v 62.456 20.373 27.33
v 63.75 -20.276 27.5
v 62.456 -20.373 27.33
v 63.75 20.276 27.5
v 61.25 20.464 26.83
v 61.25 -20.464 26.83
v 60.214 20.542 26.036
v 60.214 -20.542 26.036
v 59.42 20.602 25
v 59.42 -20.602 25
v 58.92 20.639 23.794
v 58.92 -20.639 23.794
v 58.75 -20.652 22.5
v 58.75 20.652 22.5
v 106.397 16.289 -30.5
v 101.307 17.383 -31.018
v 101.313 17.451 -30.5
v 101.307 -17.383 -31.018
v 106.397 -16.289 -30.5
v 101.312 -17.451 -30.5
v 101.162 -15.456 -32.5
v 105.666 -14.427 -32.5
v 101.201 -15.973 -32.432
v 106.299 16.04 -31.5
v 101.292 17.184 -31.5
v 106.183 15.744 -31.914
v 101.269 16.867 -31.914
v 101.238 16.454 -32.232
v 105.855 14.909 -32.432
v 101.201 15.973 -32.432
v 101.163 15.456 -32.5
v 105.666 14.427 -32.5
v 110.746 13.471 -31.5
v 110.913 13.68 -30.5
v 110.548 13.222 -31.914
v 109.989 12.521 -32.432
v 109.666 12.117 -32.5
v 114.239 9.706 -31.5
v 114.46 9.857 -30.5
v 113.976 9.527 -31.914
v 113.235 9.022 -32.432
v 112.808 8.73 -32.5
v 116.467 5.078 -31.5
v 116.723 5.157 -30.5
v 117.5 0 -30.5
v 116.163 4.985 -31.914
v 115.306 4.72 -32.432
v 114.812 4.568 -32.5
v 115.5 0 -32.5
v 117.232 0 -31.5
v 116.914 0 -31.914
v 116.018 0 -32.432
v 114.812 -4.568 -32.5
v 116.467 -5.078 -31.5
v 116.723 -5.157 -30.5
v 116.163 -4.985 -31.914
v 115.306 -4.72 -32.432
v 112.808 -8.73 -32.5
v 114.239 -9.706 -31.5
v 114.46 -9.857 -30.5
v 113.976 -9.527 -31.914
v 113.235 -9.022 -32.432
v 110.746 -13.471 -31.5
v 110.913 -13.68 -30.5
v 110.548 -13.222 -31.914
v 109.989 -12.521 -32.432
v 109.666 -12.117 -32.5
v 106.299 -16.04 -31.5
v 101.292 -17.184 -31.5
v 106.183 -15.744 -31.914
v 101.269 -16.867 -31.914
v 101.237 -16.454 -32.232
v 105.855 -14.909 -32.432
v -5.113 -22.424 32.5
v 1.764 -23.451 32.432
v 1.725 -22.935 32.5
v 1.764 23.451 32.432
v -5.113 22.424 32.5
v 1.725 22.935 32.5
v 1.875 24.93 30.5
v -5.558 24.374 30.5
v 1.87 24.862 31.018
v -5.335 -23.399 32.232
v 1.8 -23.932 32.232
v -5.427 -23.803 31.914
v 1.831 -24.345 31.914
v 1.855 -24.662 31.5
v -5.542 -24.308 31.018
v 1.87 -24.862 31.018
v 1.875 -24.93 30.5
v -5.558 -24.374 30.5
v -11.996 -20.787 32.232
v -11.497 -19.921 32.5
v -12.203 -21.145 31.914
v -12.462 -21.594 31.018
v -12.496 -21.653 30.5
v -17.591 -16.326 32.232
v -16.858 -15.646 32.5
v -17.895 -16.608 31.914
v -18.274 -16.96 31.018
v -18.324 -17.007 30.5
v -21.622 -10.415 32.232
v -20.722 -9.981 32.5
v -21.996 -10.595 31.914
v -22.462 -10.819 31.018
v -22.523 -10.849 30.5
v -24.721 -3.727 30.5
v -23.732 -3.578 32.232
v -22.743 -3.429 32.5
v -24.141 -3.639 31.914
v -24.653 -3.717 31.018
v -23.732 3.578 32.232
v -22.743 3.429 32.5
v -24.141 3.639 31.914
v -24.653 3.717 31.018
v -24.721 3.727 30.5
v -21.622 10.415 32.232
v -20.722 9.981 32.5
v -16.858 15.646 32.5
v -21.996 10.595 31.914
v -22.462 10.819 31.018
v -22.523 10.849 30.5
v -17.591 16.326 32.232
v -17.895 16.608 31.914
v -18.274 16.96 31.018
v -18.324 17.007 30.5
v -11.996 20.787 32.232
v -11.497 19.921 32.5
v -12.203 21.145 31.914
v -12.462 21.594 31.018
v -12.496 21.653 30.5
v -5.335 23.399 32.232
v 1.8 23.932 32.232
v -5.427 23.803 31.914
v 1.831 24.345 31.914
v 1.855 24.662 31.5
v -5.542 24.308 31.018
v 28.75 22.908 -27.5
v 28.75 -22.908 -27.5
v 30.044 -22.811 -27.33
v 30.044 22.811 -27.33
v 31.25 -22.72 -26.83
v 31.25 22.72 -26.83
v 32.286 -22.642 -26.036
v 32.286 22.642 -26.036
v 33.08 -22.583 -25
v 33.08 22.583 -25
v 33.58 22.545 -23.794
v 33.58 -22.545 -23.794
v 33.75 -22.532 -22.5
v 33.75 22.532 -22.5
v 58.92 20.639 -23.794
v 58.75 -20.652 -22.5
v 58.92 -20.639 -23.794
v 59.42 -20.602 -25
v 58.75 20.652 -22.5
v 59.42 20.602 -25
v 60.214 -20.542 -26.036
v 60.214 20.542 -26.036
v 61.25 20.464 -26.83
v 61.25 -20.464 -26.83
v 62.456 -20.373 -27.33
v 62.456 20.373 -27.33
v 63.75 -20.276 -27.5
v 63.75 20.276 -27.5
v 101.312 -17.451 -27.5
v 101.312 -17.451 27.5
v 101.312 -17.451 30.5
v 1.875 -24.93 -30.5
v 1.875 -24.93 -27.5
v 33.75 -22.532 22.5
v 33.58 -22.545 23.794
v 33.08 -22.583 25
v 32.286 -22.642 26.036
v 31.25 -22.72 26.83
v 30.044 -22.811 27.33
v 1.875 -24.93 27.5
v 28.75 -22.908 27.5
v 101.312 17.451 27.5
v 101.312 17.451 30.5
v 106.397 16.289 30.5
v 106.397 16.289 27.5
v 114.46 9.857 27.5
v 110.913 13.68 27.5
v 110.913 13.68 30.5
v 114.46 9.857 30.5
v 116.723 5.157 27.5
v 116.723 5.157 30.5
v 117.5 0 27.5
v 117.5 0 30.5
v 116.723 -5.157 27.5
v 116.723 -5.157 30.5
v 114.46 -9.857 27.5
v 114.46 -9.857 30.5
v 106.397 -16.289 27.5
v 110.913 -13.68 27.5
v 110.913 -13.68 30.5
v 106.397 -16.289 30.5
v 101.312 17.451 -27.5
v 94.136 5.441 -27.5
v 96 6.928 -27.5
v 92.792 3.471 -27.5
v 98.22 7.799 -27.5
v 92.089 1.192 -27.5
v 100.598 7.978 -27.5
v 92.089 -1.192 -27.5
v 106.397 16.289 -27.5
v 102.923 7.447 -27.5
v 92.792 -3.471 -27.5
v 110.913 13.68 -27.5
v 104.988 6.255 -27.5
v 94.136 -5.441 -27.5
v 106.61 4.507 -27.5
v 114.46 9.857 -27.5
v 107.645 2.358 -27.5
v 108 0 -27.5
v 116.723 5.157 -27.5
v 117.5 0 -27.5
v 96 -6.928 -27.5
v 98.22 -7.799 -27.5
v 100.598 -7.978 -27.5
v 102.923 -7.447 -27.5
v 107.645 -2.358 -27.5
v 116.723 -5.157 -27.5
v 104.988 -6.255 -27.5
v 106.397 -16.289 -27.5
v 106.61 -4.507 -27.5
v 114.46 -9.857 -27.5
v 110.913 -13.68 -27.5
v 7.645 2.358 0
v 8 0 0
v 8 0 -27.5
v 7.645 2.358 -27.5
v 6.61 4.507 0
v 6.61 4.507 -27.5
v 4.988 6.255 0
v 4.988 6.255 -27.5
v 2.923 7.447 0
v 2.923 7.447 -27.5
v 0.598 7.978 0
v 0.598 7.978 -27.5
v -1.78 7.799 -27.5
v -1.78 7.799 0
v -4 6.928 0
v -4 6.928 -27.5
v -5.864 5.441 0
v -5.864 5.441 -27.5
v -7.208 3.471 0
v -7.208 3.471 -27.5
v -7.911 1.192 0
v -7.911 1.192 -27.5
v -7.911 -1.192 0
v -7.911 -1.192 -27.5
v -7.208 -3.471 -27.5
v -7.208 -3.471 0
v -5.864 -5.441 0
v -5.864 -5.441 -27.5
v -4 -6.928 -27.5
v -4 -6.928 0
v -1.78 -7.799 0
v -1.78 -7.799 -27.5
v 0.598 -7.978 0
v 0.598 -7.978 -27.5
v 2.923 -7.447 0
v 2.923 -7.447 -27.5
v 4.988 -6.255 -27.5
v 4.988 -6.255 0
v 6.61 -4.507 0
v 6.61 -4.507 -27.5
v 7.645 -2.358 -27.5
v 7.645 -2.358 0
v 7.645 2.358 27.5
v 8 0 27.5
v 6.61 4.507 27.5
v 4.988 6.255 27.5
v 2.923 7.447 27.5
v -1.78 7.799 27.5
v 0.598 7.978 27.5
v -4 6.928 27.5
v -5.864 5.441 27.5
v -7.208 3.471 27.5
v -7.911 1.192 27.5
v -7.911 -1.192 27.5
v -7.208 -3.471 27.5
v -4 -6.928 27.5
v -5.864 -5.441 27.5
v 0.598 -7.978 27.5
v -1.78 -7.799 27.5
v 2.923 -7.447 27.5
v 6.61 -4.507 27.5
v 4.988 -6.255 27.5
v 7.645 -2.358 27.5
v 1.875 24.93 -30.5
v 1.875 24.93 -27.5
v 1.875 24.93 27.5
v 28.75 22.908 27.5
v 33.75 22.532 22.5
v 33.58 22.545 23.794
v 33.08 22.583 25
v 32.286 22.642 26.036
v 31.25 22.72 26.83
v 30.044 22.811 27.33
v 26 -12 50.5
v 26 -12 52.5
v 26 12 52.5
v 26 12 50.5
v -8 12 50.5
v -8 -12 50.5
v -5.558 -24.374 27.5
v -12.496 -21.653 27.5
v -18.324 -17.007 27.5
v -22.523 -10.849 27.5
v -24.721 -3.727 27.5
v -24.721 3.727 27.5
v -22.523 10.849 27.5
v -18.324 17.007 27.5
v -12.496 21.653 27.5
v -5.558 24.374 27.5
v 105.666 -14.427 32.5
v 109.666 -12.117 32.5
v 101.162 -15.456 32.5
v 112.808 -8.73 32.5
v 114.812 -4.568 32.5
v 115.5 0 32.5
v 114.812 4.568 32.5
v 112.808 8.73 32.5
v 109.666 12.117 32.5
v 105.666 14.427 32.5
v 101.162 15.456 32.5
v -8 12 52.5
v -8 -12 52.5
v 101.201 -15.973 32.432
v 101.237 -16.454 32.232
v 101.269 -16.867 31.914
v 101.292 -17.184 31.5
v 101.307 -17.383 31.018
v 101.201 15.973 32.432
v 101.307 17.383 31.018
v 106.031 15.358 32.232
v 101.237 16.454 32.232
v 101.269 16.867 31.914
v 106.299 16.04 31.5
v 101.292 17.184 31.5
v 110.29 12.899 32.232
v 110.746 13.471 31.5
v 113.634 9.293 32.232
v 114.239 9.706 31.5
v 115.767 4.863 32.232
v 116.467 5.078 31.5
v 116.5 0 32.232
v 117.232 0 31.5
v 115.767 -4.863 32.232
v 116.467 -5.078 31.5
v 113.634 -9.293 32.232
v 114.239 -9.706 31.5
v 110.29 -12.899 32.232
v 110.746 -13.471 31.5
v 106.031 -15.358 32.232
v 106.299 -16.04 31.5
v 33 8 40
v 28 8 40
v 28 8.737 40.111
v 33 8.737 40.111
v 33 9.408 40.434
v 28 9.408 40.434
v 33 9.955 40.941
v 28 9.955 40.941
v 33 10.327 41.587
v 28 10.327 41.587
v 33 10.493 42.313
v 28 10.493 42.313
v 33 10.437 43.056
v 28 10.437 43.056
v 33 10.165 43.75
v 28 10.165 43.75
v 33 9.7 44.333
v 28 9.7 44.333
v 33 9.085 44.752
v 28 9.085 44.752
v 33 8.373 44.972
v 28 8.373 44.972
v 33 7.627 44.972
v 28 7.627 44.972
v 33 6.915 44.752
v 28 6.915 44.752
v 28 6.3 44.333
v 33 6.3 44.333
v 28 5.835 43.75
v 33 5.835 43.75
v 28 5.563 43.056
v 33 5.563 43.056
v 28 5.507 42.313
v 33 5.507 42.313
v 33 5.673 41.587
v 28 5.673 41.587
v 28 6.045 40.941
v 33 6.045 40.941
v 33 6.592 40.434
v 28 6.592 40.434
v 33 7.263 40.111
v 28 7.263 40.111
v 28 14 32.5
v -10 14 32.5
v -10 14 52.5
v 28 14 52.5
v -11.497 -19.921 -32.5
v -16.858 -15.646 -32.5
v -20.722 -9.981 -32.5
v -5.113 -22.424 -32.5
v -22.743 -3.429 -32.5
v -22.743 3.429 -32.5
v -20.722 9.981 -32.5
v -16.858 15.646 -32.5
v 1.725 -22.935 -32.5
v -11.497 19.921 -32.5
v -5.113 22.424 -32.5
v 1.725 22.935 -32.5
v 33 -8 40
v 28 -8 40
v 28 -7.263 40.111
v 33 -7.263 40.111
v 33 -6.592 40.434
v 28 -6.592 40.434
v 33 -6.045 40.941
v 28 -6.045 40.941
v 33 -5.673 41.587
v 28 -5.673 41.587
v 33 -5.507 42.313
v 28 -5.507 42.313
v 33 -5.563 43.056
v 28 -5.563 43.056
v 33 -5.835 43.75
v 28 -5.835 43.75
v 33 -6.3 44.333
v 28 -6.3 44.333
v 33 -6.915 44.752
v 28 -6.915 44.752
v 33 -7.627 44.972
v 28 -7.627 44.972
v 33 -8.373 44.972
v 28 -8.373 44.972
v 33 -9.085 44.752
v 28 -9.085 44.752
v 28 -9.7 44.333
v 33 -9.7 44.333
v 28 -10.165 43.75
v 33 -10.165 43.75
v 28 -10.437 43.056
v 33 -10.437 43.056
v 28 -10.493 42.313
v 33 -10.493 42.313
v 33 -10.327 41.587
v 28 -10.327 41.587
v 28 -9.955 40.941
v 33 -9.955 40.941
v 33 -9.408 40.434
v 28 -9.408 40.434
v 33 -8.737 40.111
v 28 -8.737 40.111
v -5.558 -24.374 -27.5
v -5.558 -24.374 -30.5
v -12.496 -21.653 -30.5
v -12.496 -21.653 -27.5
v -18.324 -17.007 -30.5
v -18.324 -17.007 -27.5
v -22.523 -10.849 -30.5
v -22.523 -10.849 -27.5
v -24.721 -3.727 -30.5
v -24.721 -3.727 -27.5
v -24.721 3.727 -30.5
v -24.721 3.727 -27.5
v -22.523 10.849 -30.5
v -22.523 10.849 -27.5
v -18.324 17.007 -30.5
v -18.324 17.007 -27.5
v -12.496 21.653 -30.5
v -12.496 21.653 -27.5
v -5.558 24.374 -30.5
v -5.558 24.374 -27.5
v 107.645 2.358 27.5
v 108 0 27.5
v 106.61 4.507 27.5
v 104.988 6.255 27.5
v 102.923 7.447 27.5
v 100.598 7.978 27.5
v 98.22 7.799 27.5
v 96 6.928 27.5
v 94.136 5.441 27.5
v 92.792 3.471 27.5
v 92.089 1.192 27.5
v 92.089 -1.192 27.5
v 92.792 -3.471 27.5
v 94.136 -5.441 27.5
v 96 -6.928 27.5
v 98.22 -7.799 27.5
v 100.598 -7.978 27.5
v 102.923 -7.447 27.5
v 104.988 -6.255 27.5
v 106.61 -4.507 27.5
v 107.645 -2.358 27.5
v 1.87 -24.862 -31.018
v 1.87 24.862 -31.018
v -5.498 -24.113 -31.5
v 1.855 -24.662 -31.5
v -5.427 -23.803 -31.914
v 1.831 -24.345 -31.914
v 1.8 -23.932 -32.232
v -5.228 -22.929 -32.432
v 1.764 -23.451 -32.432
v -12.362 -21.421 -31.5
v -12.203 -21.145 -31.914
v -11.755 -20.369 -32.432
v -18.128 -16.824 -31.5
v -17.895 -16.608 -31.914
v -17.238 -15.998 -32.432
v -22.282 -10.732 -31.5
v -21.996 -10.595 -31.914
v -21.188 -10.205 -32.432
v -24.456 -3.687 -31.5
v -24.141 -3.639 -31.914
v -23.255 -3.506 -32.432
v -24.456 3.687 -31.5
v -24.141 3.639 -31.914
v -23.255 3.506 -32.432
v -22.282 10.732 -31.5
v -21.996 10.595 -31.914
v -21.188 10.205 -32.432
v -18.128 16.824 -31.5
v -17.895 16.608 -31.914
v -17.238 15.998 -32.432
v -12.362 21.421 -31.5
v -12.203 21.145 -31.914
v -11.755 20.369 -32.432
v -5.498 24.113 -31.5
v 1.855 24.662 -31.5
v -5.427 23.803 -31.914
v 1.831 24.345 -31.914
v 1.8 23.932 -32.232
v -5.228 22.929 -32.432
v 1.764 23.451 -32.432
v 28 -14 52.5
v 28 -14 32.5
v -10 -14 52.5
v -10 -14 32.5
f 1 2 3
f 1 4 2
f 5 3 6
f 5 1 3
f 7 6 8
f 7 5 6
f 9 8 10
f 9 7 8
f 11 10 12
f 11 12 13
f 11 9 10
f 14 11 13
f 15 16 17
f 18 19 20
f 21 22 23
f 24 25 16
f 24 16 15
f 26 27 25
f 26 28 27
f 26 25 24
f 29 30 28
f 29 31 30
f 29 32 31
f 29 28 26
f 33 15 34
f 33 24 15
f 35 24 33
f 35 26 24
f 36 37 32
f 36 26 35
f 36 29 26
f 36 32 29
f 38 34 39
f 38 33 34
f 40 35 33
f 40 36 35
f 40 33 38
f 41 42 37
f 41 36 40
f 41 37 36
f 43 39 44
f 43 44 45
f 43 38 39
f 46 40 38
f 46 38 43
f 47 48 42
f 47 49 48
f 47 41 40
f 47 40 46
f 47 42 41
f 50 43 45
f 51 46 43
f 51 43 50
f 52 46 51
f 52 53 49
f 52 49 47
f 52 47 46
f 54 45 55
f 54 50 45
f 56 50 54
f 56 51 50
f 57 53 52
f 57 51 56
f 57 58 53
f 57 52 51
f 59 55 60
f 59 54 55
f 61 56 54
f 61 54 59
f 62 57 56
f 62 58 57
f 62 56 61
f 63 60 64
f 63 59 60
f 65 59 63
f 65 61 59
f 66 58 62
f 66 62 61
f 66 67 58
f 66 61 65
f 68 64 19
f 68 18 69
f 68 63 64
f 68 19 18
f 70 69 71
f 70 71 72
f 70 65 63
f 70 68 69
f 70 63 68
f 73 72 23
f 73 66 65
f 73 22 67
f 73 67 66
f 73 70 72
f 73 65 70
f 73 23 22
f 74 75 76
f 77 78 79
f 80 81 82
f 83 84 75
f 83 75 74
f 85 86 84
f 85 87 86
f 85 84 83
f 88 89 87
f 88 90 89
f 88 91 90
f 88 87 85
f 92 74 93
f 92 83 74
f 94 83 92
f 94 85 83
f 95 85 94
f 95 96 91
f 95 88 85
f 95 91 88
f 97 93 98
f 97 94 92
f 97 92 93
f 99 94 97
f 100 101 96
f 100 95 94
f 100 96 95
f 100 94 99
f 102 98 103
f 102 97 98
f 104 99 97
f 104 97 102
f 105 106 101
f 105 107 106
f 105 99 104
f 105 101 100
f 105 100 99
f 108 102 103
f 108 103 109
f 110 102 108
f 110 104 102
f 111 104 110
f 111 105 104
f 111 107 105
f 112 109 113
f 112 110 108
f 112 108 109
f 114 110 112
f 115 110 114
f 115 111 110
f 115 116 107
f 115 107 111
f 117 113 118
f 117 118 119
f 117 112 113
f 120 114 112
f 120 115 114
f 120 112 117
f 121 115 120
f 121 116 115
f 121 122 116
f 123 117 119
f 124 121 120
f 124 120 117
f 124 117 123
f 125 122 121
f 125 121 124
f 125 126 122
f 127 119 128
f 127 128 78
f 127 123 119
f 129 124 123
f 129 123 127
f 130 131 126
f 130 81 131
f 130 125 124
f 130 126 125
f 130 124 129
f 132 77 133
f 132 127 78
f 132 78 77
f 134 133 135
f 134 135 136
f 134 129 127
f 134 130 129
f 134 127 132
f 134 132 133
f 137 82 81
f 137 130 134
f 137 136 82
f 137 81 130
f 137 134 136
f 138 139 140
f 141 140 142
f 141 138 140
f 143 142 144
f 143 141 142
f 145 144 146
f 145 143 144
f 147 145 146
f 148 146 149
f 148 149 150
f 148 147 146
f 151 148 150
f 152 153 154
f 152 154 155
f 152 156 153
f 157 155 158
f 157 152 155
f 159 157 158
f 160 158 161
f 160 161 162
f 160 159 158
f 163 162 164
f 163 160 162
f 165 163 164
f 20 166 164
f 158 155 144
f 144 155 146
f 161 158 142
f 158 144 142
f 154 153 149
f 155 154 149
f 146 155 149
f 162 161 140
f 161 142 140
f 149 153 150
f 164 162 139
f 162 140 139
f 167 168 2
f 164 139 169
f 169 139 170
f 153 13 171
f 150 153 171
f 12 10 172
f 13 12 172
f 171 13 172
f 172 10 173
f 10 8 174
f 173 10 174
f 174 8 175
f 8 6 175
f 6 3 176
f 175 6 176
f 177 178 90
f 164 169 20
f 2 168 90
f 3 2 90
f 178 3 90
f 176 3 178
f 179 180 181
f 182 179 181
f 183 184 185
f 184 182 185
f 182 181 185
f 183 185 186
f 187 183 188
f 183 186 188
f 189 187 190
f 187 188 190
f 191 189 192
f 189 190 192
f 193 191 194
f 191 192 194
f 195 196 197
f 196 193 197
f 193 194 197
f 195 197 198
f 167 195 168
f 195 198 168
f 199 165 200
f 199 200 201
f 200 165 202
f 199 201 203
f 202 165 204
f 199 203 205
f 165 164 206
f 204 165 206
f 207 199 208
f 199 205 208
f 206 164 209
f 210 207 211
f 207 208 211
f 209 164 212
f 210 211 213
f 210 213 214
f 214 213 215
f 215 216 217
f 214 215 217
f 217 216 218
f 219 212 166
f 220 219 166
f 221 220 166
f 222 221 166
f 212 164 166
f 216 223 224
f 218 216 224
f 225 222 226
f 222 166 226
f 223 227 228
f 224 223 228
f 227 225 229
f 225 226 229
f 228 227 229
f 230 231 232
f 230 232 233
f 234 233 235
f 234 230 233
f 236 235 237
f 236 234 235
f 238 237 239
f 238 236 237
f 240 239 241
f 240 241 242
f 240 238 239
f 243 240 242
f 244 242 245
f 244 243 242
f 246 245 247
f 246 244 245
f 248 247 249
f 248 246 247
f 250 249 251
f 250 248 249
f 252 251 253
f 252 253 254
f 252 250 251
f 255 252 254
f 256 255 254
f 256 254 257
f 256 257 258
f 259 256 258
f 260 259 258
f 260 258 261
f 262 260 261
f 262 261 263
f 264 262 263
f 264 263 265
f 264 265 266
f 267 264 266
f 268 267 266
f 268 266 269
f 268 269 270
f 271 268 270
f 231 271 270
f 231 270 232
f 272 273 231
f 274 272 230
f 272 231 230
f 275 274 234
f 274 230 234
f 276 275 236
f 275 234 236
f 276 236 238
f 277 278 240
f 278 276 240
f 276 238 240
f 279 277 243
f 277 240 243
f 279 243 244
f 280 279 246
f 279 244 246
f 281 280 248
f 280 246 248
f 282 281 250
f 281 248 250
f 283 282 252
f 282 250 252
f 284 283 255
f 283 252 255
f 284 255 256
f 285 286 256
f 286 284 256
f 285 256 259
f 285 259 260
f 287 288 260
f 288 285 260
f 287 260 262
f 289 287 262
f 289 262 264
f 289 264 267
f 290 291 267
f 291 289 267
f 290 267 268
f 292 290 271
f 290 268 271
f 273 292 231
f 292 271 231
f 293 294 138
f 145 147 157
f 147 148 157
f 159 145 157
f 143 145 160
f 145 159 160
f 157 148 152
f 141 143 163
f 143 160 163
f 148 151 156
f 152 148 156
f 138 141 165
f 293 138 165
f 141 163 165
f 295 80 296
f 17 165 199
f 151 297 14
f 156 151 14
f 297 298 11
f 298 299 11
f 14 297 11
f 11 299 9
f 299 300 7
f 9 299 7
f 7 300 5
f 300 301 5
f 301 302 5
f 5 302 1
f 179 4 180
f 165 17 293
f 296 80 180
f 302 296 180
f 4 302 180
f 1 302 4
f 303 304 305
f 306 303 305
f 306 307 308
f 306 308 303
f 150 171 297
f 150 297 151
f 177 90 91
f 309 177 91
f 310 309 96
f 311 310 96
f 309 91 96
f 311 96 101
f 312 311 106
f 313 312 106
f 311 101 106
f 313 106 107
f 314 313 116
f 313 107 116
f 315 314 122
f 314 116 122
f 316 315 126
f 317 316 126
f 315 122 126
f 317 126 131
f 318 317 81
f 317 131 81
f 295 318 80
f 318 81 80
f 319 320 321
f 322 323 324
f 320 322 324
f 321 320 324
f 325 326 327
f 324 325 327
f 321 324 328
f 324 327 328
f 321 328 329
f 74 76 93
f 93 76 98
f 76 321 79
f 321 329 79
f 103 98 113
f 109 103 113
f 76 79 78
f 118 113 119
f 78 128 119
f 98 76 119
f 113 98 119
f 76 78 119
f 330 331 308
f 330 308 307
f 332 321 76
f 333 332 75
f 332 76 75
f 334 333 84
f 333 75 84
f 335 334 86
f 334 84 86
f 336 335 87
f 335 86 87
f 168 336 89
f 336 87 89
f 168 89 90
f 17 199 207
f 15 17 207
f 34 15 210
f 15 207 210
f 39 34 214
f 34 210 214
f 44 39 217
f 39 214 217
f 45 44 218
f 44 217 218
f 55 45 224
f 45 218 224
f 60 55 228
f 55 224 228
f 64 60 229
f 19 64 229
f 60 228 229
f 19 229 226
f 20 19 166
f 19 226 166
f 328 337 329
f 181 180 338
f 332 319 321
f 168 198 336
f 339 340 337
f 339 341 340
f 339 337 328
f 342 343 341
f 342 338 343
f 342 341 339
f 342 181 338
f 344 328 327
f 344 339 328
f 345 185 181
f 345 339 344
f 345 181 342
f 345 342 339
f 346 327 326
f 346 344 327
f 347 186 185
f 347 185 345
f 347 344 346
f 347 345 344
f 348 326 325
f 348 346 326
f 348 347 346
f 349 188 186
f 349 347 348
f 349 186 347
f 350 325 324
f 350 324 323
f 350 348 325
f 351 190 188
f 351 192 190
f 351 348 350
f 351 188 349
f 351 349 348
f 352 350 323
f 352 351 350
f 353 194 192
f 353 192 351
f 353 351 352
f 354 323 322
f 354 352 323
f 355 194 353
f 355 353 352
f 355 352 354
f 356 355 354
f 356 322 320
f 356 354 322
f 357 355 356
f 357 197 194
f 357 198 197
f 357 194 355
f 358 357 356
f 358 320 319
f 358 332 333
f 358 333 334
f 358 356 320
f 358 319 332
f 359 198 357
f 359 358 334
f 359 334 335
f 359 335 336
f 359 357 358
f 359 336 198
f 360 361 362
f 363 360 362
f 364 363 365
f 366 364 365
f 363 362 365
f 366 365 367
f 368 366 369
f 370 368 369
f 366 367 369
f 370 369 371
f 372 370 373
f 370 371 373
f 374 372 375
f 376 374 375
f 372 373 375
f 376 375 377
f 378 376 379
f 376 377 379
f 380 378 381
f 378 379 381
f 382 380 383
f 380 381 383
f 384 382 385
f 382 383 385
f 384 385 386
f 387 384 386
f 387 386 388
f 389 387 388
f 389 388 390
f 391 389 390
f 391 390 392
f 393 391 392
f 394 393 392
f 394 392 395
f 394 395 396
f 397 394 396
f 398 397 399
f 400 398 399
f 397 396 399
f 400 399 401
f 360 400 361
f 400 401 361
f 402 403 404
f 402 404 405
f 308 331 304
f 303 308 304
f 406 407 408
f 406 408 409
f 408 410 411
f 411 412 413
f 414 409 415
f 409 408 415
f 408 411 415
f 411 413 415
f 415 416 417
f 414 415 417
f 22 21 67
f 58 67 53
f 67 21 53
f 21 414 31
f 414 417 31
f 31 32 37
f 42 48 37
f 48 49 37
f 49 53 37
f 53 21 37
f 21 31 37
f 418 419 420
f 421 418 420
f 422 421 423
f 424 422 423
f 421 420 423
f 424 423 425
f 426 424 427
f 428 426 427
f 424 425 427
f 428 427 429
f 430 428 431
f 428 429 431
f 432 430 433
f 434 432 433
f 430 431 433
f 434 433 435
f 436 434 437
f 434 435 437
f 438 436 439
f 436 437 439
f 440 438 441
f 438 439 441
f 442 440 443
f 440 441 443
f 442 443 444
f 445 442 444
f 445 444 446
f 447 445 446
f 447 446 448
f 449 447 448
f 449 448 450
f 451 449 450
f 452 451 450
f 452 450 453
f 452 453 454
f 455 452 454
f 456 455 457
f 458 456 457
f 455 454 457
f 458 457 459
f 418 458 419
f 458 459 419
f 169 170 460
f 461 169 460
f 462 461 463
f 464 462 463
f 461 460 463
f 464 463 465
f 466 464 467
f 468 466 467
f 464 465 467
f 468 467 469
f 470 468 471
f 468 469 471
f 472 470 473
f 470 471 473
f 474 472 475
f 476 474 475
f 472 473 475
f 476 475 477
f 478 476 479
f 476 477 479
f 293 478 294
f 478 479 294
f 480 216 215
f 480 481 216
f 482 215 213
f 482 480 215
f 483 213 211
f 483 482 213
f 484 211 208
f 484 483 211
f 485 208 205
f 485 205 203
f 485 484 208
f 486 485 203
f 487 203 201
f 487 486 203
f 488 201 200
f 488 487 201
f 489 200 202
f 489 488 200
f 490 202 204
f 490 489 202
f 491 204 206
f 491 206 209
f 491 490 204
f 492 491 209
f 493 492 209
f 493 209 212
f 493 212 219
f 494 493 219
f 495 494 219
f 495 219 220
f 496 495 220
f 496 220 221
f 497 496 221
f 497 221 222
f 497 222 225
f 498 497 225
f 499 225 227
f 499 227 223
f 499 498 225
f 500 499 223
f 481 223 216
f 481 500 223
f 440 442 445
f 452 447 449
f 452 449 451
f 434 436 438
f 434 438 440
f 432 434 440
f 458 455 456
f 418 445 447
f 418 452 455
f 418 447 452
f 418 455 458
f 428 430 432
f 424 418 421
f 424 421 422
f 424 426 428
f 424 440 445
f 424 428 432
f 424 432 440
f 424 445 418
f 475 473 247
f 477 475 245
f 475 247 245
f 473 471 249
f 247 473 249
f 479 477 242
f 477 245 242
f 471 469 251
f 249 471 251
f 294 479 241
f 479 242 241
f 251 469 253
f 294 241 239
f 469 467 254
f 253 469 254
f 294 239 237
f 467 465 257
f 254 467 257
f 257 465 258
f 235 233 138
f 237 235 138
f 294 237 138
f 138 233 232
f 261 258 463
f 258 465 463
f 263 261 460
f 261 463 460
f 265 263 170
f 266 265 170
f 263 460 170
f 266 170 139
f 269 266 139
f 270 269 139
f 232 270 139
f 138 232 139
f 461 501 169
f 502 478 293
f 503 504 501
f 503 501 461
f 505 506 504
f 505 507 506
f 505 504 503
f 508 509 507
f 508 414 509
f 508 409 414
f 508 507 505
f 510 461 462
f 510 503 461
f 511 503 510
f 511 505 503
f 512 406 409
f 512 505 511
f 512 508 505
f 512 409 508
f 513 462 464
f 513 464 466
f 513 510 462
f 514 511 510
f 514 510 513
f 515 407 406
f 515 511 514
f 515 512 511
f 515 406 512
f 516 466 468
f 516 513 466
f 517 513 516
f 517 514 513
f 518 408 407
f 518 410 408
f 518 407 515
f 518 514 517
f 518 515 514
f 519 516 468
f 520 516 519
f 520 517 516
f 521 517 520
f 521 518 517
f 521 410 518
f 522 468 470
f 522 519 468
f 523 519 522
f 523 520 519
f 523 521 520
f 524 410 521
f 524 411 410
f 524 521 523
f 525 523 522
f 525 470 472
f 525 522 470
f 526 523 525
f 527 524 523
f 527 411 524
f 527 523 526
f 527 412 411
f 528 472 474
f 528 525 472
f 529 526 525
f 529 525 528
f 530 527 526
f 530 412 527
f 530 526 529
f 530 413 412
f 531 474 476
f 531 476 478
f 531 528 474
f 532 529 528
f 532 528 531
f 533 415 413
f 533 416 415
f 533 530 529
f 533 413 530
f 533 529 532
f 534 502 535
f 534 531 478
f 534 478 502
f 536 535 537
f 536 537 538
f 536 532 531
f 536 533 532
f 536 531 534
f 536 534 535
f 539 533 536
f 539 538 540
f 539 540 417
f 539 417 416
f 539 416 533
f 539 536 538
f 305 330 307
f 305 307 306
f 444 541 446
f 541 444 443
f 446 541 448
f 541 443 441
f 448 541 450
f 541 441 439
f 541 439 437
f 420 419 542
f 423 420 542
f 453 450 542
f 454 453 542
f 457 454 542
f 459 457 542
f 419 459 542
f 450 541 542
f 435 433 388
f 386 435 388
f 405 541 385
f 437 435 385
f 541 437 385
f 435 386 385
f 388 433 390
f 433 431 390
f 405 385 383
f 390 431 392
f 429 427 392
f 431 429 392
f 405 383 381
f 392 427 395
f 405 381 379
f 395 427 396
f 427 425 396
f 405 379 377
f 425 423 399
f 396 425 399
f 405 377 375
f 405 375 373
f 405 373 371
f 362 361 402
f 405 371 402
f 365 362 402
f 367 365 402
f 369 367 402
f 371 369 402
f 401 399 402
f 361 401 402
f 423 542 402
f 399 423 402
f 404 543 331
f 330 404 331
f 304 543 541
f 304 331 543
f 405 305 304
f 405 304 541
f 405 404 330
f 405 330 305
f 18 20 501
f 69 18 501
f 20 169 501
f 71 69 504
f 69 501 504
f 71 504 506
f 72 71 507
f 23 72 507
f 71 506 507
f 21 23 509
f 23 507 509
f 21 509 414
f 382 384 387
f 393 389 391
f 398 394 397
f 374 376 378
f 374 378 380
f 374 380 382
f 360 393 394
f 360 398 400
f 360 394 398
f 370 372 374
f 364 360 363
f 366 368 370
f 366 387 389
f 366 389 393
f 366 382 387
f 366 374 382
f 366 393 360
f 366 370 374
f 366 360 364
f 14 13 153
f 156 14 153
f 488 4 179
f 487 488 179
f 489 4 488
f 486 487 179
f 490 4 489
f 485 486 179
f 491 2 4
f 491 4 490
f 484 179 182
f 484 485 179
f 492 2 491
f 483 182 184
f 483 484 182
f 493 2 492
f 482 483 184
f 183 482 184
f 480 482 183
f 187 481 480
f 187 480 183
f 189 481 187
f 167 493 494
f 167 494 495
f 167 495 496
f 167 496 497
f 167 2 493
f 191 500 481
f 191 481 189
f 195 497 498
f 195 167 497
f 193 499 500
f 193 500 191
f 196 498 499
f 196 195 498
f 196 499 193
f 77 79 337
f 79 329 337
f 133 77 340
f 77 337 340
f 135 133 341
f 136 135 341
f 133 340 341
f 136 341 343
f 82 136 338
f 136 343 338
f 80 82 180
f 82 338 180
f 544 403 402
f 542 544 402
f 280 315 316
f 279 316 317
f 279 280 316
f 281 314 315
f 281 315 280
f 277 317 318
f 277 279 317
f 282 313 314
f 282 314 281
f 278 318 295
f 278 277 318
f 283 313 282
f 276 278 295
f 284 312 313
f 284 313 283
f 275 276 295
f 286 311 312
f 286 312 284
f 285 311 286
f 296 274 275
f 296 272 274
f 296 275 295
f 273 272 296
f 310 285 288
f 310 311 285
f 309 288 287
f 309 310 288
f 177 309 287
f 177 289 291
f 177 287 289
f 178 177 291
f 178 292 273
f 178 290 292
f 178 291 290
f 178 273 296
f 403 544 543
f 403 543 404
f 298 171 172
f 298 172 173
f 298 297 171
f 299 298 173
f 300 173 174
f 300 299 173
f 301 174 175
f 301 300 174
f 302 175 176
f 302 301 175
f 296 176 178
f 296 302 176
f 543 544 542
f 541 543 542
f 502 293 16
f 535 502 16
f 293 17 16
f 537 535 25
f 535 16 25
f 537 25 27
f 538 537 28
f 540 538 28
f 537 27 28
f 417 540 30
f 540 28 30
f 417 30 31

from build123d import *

# Parameters (mm, degrees)
Y_KSEKLIK_EKSTR_ZYON1_DEPTH = 32.5
IZIM3_W                     = 58.75
IZIM3_H                     = 55
KES_EKSTR_ZYON1_DEPTH       = 26
KES_EKSTR_ZYON1_DEPTH_BACK  = 26
IZIM4_R                     = 8
Y_KSEKLIK_EKSTR_ZYON2_DEPTH = 32.5
RADYUS1_R                   = 5
IZIM5_W                     = 38
IZIM5_H                     = 28
Y_KSEKLIK_EKSTR_ZYON3_DEPTH = 20
IZIM6_R                     = 2.5
Y_KSEKLIK_EKSTR_ZYON4_DEPTH = 5
IZIM7_W                     = 34
IZIM7_H                     = 24
KES_EKSTR_ZYON2_DEPTH       = 2
RADYUS2_R                   = 2


with BuildPart() as part:
    # Çizim1 → Yükseklik-Ekstrüzyon1 (new body, symmetric)
    with BuildSketch(Plane.XY):
        with BuildLine():
            Line((1.875, 24.929588344), (101.3125, 17.450711841))
            ThreePointArc((101.3125, 17.450711841), (117.5, 0), (101.3125, -17.450711841))
            Line((101.3125, -17.450711841), (1.875, -24.929588344))
            ThreePointArc((1.875, -24.929588344), (-25, 0), (1.875, 24.929588344))
        make_face()
    extrude(amount=Y_KSEKLIK_EKSTR_ZYON1_DEPTH, both=True)

    # Çizim3 → Kes-Ekstrüzyon1 (cut, two sides)
    with BuildSketch(Plane(origin=(0, 0, 0), x_dir=(1, 0, 0), z_dir=(0, 1, 0))) as kes_ekstr_zyon1_sk:
        with Locations((4.375, 0)):
            Rectangle(IZIM3_W, IZIM3_H)
        with Locations((88.125, 0)):
            Rectangle(IZIM3_W, IZIM3_H)
    extrude(amount=KES_EKSTR_ZYON1_DEPTH, mode=Mode.SUBTRACT)
    extrude(kes_ekstr_zyon1_sk.sketch, amount=-KES_EKSTR_ZYON1_DEPTH_BACK, mode=Mode.SUBTRACT)

    # Çizim4 → Yükseklik-Ekstrüzyon2 (add, symmetric)
    with BuildSketch(Plane.XY):
        Circle(IZIM4_R)
        with Locations((100, 0)):
            Circle(IZIM4_R)
    extrude(amount=Y_KSEKLIK_EKSTR_ZYON2_DEPTH, both=True)

    # Radyus1
    radyus1_edges = [part.edges().sort_by_distance(p)[0] for p in [
        (33.75, 0, -27.5),
        (33.75, 0, 27.5),
        (58.75, 0, 27.5),
        (58.75, 0, -27.5),
    ]]
    fillet(radyus1_edges, radius=RADYUS1_R)

    # Radyus2
    radyus2_edges = [part.edges().sort_by_distance(p)[0] for p in [
        (117.5, 0, 32.5),
        (51.59375, 21.190150092, 32.5),
        (-25, 0, 32.5),
        (51.59375, 21.190150092, -32.5),
        (117.5, 0, -32.5),
        (51.59375, -21.190150092, -32.5),
        (-25, 0, -32.5),
        (51.59375, -21.190150092, 32.5),
    ]]
    fillet(radyus2_edges, radius=RADYUS2_R)


with BuildPart() as body_2:
    # Çizim5 → Yükseklik-Ekstrüzyon3 (new body)
    with BuildSketch(Plane.XY.offset(32.5)):
        with Locations((9, 0)):
            Rectangle(IZIM5_W, IZIM5_H)
    extrude(amount=Y_KSEKLIK_EKSTR_ZYON3_DEPTH)

    # Çizim6 → Yükseklik-Ekstrüzyon4 (add)
    with BuildSketch(Plane(origin=(28, 0, 0), x_dir=(0, 0, -1), z_dir=(1, 0, 0))):
        with Locations((-42.5, 8)):
            Circle(IZIM6_R)
        with Locations((-42.5, -8)):
            Circle(IZIM6_R)
    extrude(amount=Y_KSEKLIK_EKSTR_ZYON4_DEPTH)

    # Çizim7 → Kes-Ekstrüzyon2 (cut)
    with BuildSketch(Plane.XY.offset(52.5)):
        with Locations((9, 0)):
            Rectangle(IZIM7_W, IZIM7_H)
    extrude(amount=-KES_EKSTR_ZYON2_DEPTH, mode=Mode.SUBTRACT)


solid = Compound([part.part, body_2.part])
